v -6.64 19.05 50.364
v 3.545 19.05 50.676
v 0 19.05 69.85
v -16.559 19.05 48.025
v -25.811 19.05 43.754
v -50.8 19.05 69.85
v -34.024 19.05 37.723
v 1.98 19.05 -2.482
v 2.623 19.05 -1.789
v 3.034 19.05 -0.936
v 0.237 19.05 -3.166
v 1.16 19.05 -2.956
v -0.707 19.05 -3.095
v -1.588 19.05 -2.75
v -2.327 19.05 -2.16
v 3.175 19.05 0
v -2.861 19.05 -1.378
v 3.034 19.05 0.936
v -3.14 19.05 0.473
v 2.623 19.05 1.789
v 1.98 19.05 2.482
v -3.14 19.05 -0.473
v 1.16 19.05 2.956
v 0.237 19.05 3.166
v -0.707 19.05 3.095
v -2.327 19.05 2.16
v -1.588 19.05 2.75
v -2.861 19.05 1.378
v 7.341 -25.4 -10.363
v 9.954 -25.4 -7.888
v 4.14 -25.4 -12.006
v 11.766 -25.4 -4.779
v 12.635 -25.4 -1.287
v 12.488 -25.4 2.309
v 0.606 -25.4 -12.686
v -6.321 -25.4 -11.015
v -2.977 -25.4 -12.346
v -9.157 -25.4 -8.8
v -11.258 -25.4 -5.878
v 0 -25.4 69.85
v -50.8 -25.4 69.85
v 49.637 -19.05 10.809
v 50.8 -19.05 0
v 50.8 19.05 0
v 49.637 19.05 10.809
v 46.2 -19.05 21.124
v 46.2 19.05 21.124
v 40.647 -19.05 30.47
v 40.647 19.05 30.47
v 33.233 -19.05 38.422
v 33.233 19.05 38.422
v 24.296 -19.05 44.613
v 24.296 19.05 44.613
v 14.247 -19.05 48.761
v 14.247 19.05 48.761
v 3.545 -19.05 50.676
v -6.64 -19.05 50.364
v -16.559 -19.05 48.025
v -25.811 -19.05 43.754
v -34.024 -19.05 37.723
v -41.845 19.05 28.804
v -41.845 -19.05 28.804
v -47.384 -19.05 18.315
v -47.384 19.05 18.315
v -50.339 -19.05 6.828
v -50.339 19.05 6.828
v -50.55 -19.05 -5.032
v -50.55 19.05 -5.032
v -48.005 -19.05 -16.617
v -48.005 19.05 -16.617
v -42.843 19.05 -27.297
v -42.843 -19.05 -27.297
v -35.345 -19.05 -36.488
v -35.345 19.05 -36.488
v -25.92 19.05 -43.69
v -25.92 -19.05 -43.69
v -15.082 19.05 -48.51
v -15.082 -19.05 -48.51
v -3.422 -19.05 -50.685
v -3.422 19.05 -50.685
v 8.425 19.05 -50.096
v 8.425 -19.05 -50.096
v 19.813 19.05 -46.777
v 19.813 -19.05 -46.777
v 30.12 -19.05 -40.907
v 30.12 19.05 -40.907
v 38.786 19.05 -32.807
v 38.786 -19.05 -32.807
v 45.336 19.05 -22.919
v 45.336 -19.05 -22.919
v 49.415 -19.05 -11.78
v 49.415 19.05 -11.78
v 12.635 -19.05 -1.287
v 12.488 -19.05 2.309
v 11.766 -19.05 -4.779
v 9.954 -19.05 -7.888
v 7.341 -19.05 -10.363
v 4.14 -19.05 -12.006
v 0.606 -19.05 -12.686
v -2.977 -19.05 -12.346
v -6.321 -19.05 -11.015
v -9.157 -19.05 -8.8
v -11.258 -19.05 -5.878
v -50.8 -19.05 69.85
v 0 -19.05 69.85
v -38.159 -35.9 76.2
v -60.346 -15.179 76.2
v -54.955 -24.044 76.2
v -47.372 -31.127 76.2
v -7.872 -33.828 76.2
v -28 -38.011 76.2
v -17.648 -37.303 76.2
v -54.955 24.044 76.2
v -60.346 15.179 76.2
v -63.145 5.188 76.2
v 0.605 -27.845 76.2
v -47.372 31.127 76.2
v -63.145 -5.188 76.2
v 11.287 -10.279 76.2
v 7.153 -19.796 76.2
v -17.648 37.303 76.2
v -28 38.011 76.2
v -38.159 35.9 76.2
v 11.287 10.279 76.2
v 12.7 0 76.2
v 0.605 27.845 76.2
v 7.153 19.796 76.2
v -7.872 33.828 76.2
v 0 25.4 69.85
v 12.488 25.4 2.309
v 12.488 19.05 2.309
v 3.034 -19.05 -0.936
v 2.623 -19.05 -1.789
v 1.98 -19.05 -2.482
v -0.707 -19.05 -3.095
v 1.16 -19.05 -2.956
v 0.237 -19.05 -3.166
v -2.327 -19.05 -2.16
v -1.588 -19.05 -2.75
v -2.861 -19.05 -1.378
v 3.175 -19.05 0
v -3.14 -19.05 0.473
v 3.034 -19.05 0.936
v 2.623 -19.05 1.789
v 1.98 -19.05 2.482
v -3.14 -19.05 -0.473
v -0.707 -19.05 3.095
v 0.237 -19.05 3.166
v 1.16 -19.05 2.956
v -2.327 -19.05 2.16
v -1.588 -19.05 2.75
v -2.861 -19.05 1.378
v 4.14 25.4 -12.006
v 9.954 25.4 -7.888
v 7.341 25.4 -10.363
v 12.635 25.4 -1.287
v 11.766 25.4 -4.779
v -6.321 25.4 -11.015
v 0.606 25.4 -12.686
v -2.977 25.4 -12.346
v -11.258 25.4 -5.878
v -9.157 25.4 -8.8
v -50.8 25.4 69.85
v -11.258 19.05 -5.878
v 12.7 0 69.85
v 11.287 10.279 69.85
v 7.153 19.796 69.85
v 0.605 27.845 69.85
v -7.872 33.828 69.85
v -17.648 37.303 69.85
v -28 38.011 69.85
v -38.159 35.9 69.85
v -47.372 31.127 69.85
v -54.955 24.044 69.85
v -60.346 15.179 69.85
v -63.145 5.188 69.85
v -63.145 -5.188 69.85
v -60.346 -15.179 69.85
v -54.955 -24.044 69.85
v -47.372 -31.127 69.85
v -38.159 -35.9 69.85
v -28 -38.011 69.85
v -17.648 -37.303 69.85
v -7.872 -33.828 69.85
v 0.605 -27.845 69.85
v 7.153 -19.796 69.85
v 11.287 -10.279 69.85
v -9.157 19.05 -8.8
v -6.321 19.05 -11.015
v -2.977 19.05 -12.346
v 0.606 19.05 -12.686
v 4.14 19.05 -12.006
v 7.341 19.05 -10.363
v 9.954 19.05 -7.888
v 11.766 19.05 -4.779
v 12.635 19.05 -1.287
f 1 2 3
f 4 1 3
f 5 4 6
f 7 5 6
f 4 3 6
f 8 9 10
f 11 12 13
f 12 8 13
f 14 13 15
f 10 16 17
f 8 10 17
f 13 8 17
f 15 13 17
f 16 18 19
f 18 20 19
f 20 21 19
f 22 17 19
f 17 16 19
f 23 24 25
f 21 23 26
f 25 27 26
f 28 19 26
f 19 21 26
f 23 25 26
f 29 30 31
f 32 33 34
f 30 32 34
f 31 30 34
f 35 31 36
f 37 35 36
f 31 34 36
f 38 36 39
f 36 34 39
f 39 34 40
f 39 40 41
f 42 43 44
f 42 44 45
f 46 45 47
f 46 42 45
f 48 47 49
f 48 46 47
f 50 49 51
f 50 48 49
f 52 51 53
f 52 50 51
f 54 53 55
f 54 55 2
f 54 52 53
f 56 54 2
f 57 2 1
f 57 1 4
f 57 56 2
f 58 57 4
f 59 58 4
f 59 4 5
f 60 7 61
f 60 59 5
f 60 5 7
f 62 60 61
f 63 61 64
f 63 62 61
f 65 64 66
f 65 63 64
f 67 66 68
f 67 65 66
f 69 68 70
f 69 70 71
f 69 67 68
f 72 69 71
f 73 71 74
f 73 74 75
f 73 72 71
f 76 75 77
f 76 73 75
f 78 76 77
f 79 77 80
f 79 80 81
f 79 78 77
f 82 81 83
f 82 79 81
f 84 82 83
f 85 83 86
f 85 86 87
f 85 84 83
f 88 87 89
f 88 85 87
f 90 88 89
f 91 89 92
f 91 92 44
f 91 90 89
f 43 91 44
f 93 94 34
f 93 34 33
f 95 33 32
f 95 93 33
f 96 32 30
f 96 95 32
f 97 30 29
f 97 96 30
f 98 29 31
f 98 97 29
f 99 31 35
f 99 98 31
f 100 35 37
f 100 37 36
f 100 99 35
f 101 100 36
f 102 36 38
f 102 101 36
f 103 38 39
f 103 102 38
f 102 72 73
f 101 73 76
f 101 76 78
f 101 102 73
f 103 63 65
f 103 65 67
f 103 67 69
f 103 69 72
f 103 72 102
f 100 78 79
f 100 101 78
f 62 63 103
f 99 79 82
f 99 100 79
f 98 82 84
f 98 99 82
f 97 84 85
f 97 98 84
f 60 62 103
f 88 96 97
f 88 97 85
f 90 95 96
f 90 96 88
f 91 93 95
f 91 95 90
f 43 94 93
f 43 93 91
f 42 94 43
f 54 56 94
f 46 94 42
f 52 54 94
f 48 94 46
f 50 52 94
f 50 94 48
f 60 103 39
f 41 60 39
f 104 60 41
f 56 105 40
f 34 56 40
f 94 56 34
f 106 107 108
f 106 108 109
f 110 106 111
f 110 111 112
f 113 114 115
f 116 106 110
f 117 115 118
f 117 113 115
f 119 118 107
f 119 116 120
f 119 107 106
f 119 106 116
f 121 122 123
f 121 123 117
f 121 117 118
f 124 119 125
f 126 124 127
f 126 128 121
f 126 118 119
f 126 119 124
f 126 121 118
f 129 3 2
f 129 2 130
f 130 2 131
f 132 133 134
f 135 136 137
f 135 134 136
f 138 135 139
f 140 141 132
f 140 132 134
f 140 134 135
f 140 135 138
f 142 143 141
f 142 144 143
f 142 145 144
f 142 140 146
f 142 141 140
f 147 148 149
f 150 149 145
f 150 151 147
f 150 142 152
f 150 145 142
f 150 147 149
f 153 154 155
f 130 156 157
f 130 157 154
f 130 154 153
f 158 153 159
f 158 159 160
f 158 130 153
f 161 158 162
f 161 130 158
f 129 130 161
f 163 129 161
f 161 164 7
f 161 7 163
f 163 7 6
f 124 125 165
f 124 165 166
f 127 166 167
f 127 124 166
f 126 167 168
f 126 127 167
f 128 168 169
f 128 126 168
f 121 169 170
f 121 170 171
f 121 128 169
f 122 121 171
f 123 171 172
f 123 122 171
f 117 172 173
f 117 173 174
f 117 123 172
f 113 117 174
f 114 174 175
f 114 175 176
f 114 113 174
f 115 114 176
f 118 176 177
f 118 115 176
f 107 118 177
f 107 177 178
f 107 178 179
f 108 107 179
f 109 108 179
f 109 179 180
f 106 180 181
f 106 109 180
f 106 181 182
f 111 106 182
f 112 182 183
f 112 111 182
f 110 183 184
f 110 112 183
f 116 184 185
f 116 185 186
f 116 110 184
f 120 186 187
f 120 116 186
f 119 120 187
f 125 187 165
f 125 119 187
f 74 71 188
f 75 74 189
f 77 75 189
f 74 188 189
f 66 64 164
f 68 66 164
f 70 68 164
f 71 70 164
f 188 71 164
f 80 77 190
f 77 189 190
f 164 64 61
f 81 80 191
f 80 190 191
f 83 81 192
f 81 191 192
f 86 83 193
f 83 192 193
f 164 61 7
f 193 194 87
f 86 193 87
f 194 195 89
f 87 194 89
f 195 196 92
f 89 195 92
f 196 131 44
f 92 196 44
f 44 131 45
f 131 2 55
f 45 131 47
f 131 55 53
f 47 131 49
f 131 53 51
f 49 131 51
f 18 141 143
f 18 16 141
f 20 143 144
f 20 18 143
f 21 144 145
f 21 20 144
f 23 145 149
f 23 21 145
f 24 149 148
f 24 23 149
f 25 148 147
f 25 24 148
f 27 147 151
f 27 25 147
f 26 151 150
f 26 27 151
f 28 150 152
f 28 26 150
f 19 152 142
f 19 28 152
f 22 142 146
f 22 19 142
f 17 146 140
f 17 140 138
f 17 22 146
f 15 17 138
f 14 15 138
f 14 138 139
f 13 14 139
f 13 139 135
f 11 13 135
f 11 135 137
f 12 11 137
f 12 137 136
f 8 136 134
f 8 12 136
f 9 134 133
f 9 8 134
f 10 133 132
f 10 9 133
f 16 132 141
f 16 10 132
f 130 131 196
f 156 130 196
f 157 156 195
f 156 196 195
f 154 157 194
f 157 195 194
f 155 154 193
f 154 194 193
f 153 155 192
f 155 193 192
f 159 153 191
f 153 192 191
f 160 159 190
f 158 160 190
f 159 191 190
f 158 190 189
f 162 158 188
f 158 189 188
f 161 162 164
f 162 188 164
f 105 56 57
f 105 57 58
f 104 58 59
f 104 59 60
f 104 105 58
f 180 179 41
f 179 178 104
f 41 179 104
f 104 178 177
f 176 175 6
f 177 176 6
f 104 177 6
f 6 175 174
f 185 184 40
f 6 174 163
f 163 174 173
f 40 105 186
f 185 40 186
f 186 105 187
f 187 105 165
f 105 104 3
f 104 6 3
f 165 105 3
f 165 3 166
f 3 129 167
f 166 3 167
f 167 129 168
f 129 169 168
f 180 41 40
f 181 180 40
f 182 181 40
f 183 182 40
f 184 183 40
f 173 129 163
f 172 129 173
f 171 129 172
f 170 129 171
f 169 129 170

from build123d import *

# Parameters (mm, degrees)
F0_R     = 50.8
F0_R_2   = 3.175
F1_DEPTH = 19.05
F3_R     = 38.1
F4_DEPTH = 6.35
F6_DEPTH = 6.35


# Not quite as in the source:
# - a pattern or mirror of a feature is missing from the dataset's text; its kind, count and spacing are read off the source's solid


with BuildPart() as f1:
    # F0 (on Front) → F1 (new body, symmetric)
    with BuildSketch(Plane.XZ):
        Circle(F0_R)
        Circle(F0_R_2, mode=Mode.SUBTRACT)
    extrude(amount=F1_DEPTH, both=True)



with BuildPart() as f4:
    # F3 (on offset) → F4 (new body)
    with BuildSketch(Plane.XY.offset(76.2)):
        with Locations((-25.4, 0)):
            Circle(F3_R)
    extrude(amount=-F4_DEPTH)


with BuildPart() as f1_1:
    add(f1.part)

    add(f4.part)  # F6 merges F4
    # F5 (on face) → F6 (join)
    with BuildSketch(Plane(origin=(0, 19.05, 0), x_dir=(-1, 0, 0), z_dir=(0, 1, 0))):
        with BuildLine():
            Line((0, 69.85), (-12.4883185087, 2.3090909091))
            ThreePointArc((-12.4883185087, 2.3090909091), (-4.1396882106, -12.0063725379), (11.2576825912, -5.8783146118))
            Line((11.2576825912, -5.8783146118), (50.8, 69.85))
            Line((50.8, 69.85), (0, 69.85))
        make_face()
    f6 = extrude(amount=F6_DEPTH)

    # F6_copies: F6 across plane
    add(f6.mirror(Plane(origin=(0, 0, 0), x_dir=(0, 0, -1), z_dir=(0, -1, 0))))


solid = f1_1.part
